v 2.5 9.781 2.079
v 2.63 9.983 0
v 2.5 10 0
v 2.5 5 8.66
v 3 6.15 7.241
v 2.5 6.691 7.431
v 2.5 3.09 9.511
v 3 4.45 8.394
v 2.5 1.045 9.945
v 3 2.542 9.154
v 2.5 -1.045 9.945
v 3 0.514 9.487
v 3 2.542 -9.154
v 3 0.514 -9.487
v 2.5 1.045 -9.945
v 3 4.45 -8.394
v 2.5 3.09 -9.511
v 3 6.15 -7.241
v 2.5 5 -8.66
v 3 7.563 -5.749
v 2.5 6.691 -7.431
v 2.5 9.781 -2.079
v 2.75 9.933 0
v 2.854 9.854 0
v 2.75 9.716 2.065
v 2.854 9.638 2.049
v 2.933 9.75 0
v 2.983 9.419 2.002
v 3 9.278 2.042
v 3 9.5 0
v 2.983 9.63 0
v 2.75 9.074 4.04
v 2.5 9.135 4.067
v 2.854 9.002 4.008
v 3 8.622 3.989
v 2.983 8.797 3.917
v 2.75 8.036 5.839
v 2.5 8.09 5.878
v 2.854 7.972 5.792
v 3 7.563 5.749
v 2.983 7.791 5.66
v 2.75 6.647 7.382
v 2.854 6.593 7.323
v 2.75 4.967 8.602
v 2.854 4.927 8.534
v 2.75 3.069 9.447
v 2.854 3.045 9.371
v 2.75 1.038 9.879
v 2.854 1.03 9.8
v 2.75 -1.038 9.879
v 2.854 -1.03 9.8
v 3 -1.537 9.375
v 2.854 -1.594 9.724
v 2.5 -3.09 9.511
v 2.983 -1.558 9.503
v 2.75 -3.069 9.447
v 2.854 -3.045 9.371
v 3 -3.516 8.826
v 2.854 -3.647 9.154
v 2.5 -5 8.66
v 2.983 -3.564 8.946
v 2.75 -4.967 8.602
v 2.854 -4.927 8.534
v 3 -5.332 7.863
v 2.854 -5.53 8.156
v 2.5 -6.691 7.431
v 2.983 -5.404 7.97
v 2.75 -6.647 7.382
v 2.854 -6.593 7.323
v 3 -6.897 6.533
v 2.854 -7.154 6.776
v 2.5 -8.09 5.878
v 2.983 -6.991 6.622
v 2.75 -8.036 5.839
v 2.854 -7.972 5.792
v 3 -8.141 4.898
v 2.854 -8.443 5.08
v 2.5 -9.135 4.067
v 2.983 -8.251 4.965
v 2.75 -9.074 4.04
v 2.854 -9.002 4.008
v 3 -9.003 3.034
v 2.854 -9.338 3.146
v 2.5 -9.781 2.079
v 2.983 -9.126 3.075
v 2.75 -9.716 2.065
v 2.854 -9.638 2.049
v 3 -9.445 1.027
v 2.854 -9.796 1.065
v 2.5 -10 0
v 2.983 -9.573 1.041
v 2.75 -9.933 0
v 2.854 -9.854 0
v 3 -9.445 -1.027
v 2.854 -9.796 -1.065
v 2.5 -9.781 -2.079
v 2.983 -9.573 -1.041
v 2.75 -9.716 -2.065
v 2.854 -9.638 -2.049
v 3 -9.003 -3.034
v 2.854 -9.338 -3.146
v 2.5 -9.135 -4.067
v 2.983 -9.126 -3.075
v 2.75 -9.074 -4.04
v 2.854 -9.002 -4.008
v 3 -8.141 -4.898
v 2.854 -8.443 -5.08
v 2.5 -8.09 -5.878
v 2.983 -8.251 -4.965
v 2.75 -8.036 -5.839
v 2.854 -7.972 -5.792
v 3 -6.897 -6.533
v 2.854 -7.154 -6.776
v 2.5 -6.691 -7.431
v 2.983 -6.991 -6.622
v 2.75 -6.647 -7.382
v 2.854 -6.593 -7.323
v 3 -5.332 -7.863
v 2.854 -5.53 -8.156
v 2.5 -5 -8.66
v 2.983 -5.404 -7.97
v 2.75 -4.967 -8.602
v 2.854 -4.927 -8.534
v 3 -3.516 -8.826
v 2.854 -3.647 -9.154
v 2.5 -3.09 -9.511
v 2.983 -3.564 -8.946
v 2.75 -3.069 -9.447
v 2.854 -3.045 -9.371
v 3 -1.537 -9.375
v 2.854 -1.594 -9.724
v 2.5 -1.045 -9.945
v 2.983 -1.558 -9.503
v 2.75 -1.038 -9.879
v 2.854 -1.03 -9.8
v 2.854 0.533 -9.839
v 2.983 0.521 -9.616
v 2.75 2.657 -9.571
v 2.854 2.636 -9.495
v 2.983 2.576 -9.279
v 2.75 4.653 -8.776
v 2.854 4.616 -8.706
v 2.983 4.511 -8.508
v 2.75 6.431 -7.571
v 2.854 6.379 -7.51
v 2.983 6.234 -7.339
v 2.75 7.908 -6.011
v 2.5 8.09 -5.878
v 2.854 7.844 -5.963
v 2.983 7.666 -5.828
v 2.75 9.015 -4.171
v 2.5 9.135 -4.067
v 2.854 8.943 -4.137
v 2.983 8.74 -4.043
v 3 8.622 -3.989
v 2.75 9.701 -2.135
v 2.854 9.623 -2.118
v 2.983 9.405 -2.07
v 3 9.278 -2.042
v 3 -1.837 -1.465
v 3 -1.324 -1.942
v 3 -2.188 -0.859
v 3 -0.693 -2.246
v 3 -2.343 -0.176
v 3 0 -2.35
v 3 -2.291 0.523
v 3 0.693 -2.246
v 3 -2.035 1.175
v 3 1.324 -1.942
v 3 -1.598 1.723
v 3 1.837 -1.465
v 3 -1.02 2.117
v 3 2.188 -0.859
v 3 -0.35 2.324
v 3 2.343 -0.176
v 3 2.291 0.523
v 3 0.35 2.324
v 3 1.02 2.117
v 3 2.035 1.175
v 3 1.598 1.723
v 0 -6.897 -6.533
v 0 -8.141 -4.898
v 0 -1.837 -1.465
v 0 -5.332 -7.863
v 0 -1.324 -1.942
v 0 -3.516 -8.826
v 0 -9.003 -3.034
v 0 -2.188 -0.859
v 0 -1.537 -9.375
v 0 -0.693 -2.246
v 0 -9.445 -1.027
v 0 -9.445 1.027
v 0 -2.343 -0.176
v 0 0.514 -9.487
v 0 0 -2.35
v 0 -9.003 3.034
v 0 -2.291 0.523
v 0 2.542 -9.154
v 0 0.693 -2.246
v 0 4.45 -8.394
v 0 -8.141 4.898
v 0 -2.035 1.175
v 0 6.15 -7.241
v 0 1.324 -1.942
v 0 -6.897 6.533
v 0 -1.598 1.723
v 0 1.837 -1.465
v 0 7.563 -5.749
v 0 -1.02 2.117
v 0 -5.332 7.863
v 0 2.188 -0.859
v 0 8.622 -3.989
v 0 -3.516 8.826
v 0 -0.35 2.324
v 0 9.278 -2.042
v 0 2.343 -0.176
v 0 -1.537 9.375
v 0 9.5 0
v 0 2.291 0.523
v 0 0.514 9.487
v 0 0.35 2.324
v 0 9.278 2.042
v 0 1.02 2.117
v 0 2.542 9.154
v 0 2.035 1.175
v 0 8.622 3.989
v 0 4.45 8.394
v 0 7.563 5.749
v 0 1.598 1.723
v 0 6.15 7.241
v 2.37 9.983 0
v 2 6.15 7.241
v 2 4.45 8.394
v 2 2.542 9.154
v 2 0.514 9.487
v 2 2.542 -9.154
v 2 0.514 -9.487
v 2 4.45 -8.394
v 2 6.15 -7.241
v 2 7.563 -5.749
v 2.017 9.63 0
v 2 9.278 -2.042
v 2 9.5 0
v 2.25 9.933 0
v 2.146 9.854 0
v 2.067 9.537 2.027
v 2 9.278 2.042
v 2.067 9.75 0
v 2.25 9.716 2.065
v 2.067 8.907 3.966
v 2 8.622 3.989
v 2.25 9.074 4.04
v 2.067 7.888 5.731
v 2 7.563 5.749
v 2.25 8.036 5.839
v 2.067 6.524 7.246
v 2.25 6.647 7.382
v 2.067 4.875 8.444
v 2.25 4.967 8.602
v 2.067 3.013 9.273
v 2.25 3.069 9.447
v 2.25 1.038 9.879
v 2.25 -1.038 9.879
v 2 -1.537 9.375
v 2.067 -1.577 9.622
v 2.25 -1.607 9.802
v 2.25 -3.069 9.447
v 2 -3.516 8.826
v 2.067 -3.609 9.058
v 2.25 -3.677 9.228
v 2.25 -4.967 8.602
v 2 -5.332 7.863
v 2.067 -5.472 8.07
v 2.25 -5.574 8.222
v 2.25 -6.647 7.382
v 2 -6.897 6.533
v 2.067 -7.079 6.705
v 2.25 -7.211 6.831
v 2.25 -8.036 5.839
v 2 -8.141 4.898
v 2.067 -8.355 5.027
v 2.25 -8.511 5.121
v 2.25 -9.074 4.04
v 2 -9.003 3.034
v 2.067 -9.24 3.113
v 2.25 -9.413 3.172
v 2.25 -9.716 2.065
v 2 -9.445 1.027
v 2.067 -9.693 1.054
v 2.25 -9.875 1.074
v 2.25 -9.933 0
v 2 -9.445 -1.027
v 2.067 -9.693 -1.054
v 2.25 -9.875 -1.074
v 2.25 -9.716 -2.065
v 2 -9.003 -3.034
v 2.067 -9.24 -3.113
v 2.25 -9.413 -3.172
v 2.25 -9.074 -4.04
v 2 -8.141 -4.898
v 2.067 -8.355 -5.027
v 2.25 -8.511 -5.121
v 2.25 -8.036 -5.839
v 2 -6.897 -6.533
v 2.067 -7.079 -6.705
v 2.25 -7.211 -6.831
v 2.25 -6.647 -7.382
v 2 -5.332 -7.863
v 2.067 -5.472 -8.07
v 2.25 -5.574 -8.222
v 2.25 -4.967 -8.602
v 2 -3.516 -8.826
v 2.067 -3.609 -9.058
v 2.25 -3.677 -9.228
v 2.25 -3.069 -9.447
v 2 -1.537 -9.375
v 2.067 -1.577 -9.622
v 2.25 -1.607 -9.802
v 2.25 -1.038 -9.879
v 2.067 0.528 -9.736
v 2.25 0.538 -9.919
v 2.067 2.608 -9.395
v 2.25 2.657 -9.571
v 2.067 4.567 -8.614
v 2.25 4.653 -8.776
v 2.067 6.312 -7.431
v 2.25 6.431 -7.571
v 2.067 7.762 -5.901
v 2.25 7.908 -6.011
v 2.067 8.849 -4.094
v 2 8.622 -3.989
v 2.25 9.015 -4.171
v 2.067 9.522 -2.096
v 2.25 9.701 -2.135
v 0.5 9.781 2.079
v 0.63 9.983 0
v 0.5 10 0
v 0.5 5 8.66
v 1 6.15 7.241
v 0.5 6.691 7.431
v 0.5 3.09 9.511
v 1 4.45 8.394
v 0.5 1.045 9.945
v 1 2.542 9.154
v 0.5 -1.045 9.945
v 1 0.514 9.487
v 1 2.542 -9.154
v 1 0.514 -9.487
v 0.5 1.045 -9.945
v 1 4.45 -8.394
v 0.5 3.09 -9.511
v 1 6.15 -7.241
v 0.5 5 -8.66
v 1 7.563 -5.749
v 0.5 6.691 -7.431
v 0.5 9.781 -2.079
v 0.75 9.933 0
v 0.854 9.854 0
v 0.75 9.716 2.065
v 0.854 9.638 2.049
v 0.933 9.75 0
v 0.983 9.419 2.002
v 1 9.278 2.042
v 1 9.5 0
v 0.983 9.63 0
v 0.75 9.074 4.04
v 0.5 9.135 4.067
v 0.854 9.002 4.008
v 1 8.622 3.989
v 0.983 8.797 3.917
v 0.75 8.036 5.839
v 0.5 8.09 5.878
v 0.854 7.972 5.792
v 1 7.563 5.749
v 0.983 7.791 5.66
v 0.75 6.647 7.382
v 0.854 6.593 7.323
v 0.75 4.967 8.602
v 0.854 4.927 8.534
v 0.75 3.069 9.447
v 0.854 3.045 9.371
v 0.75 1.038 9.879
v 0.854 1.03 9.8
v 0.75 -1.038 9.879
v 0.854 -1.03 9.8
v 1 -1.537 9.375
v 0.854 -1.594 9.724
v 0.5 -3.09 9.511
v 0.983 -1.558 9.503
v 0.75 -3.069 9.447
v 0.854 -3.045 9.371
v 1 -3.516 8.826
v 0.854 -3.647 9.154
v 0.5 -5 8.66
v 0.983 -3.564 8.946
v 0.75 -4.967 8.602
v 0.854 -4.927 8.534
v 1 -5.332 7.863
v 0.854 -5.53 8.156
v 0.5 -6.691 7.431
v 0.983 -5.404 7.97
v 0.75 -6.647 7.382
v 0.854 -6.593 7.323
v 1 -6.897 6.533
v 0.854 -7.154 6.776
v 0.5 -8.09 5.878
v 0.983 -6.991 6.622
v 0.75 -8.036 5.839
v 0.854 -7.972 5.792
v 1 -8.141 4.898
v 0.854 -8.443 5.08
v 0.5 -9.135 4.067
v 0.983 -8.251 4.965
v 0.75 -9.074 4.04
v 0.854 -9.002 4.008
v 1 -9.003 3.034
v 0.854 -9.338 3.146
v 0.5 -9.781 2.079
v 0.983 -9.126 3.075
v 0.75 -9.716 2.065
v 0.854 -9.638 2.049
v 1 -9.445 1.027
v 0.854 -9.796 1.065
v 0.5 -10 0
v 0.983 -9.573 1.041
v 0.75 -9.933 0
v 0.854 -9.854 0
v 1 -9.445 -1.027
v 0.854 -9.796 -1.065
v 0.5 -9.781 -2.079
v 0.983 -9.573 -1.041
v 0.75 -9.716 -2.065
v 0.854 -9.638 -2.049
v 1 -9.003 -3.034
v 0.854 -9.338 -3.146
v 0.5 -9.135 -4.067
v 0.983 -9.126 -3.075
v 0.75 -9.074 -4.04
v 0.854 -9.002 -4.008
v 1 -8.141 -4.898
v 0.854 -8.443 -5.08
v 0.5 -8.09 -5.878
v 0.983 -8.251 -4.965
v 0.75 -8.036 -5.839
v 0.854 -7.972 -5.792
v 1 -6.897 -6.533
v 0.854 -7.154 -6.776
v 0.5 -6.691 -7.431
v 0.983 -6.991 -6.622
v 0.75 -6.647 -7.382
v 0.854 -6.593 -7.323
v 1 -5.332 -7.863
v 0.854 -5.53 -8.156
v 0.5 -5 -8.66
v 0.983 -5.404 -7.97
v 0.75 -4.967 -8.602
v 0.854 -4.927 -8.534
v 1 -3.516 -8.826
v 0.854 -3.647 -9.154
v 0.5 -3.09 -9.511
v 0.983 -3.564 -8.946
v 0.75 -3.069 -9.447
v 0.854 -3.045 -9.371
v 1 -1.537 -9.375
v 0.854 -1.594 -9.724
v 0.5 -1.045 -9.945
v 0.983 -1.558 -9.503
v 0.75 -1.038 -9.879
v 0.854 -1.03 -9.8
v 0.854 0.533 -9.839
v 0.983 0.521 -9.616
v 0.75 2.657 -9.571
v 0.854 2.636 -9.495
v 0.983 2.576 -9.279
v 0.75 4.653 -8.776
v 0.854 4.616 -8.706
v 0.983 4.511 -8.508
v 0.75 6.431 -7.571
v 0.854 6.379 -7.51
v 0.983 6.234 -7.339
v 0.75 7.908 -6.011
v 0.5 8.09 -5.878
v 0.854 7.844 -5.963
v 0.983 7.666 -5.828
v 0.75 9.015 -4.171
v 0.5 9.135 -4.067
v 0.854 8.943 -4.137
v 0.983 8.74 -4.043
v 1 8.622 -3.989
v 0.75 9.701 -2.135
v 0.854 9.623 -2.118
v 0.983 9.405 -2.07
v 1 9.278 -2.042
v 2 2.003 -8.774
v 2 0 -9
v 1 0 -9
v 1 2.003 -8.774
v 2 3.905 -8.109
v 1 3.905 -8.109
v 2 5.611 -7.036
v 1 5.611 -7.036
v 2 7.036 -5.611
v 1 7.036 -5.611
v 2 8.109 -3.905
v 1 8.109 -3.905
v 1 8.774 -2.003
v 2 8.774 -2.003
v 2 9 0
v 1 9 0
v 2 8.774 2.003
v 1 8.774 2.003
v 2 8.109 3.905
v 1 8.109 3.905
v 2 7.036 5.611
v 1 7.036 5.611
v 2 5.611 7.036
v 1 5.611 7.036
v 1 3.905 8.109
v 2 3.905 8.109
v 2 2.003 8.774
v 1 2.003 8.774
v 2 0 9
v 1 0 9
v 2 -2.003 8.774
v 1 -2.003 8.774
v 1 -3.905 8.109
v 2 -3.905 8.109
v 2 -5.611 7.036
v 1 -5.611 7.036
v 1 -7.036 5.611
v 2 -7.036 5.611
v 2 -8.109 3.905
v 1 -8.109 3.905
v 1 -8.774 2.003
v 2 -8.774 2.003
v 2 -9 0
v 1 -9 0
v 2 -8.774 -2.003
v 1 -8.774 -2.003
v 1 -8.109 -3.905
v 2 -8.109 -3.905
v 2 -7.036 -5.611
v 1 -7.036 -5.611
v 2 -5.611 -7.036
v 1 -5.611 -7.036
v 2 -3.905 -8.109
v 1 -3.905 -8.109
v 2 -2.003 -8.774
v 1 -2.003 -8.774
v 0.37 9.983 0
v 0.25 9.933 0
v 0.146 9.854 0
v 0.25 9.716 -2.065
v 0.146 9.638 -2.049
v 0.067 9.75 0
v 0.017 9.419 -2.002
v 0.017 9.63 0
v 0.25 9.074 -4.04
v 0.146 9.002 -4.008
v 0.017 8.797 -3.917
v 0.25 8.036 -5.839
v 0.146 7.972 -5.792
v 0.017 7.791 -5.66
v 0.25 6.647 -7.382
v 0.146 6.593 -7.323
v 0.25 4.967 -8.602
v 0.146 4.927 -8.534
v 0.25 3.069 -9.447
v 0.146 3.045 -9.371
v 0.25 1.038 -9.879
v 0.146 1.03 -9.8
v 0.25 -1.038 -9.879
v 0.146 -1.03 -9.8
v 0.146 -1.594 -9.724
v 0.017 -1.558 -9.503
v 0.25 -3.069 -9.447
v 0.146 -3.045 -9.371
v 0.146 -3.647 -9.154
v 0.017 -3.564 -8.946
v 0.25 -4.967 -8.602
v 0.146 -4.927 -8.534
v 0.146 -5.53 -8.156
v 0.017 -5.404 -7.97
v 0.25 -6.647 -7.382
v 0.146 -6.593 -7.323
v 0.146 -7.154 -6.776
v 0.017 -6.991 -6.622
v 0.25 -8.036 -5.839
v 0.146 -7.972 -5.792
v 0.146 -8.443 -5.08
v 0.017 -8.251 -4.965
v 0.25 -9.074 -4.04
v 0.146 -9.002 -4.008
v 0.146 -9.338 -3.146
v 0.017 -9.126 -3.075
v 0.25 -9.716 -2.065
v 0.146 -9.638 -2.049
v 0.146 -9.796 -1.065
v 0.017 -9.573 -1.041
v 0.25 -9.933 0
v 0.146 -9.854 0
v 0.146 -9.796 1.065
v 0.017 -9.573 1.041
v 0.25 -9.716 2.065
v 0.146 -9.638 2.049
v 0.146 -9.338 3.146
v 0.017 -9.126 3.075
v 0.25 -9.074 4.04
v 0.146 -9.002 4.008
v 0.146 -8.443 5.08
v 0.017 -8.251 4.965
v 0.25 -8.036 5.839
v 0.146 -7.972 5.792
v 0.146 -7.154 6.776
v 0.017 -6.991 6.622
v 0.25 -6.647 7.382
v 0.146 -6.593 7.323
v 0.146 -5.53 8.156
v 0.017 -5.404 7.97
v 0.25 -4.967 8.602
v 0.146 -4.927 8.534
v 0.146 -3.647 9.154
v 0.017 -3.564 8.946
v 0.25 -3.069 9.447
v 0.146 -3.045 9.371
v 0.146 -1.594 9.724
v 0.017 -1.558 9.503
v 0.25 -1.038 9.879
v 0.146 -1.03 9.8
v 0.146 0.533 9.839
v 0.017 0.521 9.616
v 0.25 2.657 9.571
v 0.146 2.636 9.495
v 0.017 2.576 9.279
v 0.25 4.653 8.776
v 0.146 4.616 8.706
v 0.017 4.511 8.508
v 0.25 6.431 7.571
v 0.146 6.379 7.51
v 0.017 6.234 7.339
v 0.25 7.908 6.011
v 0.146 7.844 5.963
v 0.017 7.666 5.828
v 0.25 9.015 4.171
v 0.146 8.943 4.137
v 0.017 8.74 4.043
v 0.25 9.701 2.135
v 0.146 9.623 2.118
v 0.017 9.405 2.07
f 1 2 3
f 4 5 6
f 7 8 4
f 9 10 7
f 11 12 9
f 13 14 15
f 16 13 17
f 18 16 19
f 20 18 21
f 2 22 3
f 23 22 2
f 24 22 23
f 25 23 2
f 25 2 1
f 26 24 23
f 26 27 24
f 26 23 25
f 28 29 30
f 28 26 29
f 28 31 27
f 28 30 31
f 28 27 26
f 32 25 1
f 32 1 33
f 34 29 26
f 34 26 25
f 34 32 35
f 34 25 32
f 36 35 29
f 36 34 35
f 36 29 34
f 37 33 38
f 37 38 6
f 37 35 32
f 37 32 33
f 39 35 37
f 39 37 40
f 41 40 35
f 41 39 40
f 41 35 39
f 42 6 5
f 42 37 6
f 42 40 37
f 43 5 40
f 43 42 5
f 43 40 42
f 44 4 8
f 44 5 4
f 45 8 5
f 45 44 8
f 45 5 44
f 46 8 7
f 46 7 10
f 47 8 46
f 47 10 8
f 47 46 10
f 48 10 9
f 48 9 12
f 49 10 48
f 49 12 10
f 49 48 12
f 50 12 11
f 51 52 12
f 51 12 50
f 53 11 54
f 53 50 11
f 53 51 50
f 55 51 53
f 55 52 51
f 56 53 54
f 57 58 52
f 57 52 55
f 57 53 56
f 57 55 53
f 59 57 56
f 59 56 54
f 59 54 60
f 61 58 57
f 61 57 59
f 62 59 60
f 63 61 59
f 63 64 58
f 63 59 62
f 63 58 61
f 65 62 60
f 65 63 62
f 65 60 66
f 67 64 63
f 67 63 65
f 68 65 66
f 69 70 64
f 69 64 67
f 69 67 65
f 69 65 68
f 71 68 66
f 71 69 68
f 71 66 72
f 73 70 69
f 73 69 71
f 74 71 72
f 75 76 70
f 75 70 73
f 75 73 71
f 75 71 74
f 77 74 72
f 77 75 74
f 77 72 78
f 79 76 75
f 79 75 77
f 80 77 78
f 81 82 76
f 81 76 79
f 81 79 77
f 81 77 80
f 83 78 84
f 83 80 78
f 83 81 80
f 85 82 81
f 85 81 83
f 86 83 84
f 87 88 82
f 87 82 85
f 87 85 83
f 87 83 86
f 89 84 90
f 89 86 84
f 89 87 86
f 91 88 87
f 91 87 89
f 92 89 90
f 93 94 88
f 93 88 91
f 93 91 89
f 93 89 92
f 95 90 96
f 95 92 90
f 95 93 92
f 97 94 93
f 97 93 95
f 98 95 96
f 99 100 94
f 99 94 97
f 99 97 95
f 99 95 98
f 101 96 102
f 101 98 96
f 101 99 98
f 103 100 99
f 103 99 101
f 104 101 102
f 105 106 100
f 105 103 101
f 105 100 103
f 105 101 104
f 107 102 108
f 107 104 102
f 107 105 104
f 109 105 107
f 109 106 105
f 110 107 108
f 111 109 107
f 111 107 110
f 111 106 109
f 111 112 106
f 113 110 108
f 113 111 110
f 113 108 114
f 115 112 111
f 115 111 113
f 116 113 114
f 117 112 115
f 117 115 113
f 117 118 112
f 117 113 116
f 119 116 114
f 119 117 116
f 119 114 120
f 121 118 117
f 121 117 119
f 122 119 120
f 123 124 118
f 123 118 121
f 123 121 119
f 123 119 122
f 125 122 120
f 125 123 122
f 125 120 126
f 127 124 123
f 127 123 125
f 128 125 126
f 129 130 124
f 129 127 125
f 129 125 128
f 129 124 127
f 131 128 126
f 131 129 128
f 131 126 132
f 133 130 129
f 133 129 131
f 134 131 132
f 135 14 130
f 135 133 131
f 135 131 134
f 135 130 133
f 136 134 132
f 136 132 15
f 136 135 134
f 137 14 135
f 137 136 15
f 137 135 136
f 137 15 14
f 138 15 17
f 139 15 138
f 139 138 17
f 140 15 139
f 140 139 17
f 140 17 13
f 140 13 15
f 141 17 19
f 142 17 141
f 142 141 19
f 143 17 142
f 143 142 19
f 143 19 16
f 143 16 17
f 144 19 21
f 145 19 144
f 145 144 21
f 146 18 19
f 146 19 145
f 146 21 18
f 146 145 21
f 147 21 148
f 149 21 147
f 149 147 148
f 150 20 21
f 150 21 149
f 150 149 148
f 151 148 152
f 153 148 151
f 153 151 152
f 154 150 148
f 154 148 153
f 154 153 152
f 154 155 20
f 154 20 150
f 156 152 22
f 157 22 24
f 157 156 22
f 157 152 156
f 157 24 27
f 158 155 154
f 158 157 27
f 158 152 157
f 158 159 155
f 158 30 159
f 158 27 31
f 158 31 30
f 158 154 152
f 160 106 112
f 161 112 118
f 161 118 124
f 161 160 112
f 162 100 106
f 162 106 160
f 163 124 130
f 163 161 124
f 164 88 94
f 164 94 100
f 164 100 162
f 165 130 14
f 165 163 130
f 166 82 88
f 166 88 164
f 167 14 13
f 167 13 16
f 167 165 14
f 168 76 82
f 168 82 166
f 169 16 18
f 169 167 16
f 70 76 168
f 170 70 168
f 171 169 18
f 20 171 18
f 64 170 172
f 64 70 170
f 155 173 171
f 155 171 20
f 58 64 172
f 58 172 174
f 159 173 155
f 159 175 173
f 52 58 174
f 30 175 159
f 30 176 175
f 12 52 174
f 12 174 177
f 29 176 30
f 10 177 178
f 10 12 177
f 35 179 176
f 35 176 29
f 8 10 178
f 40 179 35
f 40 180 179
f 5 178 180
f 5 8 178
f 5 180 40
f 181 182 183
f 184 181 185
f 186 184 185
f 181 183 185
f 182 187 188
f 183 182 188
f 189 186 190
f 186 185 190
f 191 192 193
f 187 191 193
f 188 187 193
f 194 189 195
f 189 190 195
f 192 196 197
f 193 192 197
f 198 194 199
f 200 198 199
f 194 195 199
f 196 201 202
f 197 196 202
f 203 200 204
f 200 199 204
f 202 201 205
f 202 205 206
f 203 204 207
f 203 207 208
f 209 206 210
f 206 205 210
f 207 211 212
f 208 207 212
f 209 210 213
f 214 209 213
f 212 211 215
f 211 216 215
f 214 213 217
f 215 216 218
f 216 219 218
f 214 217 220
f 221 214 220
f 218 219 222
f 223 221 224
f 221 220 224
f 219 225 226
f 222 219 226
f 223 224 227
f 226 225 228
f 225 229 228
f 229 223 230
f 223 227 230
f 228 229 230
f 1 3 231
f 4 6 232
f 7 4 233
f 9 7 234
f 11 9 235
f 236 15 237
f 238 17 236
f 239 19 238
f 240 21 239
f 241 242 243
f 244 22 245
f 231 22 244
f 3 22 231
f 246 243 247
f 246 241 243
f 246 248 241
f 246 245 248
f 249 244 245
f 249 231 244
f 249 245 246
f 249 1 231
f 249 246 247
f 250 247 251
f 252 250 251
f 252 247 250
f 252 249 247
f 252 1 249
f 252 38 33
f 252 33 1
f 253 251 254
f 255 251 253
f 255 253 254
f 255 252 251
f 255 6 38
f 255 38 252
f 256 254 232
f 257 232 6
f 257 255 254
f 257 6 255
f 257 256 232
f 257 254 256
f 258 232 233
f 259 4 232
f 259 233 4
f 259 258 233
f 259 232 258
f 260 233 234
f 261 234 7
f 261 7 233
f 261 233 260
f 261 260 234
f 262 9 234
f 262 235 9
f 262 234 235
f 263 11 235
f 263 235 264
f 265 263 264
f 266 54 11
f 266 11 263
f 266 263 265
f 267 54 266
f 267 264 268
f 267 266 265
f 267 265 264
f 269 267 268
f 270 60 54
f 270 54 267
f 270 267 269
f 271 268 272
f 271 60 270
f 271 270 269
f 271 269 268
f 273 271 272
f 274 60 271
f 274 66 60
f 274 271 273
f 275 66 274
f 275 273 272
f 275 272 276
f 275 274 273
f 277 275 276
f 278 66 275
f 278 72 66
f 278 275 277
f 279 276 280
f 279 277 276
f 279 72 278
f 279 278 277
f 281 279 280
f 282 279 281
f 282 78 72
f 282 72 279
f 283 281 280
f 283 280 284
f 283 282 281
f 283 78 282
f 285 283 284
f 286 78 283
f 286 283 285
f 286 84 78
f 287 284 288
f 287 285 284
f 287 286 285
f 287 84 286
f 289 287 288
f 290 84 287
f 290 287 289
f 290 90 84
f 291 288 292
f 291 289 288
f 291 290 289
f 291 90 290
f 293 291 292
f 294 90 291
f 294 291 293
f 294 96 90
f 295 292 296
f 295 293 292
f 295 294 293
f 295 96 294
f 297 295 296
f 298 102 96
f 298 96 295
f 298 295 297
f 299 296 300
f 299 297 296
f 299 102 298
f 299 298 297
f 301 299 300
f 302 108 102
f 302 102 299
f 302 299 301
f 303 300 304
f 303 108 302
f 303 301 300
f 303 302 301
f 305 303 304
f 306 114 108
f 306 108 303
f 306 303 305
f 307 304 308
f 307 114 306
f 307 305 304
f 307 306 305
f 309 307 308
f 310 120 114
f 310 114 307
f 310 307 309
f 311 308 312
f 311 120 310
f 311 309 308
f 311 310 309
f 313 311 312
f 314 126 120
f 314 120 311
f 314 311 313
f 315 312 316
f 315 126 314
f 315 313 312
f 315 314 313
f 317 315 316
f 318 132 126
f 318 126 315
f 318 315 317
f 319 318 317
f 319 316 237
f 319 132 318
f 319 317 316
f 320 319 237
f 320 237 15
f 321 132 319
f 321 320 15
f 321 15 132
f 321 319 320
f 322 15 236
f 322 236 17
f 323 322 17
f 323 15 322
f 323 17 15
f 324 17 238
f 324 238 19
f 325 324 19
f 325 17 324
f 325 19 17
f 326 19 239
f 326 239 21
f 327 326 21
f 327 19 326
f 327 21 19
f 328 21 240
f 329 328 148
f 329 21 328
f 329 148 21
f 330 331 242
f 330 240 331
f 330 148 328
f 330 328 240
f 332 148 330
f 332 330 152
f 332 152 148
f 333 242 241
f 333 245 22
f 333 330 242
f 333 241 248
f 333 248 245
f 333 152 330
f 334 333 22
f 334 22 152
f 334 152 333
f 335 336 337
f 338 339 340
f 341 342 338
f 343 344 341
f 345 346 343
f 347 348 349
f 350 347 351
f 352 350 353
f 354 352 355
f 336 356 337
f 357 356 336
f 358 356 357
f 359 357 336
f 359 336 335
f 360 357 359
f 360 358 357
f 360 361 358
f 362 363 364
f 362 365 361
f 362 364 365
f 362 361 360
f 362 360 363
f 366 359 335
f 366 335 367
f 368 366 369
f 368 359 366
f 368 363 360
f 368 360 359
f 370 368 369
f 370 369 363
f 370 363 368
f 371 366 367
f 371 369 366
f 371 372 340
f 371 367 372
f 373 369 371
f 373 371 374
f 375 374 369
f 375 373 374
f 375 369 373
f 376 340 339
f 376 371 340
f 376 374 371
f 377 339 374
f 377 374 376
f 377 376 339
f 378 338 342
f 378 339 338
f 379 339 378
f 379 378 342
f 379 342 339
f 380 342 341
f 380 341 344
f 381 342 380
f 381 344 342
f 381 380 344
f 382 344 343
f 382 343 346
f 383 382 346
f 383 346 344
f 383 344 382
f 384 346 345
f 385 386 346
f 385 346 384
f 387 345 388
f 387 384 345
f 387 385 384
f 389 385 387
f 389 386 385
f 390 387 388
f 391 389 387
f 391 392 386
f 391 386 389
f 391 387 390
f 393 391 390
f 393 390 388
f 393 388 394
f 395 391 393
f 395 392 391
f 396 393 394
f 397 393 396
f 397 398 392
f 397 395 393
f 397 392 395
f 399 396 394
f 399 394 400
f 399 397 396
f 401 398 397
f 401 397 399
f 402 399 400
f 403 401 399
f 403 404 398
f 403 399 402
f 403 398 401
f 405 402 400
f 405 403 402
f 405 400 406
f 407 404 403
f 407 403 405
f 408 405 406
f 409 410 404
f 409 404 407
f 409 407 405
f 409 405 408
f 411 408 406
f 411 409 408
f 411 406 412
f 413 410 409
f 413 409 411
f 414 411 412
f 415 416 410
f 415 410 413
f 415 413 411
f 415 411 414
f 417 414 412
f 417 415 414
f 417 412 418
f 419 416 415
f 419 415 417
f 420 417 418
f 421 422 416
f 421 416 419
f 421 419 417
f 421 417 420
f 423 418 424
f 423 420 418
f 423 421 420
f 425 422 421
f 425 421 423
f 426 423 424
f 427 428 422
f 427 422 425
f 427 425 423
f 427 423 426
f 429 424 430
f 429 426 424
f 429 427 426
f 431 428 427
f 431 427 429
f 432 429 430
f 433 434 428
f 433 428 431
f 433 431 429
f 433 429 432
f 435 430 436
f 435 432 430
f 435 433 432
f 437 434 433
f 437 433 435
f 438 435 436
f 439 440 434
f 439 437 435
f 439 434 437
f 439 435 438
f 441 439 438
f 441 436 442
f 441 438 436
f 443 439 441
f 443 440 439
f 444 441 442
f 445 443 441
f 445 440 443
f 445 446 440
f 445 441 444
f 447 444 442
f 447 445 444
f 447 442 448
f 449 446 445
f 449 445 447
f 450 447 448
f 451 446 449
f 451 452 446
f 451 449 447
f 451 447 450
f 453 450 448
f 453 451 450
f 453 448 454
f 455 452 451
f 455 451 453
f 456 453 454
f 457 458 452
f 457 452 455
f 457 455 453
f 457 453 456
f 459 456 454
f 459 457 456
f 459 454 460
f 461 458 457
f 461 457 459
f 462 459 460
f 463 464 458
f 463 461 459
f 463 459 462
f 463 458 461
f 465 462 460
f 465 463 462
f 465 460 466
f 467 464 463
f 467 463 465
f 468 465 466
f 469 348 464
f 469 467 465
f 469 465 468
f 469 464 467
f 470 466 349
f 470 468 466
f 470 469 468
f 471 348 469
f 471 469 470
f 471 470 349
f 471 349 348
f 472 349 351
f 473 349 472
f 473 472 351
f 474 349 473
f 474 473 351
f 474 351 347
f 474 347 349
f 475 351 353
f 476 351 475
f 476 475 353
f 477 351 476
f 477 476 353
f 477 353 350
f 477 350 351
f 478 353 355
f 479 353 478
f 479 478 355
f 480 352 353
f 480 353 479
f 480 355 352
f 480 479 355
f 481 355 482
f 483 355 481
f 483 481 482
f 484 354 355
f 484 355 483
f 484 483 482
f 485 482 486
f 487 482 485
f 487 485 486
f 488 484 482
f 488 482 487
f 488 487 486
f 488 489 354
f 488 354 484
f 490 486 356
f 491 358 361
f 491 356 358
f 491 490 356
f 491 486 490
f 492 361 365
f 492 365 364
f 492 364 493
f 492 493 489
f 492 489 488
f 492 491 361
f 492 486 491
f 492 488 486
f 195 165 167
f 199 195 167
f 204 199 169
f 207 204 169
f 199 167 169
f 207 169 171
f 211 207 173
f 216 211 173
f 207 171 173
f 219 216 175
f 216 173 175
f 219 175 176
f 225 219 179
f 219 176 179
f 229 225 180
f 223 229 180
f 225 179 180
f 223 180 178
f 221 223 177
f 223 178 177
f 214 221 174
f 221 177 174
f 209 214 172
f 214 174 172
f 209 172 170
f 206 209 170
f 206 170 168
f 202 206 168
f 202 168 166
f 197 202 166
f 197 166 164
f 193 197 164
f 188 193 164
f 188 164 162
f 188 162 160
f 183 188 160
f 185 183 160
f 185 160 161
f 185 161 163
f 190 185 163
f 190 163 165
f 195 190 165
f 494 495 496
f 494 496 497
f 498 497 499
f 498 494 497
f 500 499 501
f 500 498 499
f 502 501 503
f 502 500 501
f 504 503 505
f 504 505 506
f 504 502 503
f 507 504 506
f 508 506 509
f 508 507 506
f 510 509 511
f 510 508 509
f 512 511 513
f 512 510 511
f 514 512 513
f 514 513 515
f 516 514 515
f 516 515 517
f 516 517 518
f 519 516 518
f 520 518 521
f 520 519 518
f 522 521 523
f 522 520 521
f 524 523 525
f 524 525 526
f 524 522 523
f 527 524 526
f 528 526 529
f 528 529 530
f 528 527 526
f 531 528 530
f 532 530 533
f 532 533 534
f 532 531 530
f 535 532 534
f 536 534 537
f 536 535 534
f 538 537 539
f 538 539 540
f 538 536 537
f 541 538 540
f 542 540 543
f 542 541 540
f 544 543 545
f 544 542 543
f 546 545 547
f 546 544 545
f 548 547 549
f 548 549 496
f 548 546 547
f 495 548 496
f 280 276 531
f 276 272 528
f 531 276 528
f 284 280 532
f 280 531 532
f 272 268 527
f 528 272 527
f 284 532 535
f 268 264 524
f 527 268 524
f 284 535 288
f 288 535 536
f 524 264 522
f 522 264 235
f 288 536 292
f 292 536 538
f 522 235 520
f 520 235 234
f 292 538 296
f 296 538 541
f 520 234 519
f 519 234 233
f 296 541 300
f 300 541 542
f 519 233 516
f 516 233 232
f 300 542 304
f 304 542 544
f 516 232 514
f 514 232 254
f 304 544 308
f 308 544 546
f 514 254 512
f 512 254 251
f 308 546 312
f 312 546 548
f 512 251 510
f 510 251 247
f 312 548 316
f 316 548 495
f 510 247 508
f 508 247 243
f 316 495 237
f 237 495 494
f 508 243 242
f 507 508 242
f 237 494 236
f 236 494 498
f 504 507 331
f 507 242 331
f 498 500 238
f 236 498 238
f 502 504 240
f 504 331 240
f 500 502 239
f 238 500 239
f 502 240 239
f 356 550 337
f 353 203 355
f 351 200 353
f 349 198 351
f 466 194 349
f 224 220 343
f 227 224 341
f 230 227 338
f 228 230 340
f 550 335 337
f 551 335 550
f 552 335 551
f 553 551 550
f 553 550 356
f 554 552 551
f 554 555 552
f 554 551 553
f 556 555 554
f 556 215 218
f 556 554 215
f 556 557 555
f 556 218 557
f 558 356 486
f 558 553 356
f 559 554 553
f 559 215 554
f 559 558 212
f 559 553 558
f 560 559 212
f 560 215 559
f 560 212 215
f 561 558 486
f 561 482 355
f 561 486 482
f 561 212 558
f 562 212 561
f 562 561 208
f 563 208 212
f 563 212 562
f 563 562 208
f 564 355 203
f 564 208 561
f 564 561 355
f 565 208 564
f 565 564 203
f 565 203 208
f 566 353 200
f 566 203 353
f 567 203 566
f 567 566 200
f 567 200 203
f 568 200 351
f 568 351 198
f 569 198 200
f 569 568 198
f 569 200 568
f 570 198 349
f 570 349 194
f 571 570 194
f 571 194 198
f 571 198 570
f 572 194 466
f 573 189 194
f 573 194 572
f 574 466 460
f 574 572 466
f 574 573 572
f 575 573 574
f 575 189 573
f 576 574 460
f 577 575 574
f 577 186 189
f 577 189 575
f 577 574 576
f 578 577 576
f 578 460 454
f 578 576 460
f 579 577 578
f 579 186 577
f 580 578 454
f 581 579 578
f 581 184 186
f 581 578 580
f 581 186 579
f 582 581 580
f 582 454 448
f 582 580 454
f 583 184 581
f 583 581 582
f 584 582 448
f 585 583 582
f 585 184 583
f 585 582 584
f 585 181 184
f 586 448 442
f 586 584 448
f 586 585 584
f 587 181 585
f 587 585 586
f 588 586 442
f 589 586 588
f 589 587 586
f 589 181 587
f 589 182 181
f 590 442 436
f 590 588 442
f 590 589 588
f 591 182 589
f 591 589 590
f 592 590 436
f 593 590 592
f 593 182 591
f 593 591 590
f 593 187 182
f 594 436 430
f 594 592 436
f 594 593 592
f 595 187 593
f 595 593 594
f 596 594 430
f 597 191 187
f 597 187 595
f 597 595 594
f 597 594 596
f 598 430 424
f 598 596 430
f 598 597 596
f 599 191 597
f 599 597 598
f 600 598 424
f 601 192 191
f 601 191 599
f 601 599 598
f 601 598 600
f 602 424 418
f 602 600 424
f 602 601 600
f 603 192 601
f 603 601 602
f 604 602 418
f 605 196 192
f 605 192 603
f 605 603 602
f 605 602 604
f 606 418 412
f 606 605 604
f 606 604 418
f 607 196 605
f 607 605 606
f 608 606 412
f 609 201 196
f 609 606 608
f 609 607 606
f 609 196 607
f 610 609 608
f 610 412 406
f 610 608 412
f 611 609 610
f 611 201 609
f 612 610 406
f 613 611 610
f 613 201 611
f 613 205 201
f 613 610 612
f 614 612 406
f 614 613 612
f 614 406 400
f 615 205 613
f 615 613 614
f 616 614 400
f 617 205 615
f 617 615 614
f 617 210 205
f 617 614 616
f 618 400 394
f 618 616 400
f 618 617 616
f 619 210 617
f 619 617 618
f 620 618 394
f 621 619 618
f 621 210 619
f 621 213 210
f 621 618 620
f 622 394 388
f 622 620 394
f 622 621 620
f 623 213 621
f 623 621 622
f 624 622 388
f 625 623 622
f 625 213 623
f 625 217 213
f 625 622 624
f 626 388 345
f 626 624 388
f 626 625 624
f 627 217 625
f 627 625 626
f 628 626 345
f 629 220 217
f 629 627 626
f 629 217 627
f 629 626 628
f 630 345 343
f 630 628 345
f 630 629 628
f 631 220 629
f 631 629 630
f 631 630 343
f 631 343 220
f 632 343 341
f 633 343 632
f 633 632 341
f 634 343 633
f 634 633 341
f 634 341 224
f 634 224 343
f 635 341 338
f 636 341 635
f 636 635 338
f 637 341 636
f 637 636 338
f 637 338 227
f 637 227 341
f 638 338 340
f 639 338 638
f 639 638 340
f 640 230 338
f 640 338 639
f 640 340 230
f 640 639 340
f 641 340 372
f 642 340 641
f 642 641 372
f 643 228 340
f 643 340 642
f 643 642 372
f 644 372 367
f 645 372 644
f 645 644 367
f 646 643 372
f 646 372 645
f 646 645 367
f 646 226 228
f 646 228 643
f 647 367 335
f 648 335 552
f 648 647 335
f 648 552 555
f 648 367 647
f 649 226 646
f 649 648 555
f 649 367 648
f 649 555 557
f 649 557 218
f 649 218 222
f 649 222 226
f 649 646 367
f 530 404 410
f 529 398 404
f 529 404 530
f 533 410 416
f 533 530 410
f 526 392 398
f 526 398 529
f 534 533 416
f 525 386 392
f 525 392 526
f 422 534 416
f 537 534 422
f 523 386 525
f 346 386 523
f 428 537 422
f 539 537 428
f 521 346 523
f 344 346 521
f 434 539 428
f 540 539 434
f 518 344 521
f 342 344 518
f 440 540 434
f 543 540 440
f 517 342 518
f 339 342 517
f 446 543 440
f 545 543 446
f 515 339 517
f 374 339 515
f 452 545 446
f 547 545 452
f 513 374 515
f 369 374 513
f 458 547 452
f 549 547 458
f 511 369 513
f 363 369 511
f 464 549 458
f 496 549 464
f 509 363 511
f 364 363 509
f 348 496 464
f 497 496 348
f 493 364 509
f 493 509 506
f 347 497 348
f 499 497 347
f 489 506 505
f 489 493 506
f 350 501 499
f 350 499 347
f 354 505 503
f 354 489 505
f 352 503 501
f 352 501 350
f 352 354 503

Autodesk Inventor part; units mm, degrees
ref_plane "YZ Plane" through (0, 0, 0) normal (1, 0, 0) x (0, 1, 0)
ref_plane "XZ Plane" through (0, 0, 0) normal (0, 1, 0) x (-1, 0, 0)
ref_plane "XY Plane" through (0, 0, 0) normal (0, 0, 1) x (1, 0, 0)
sketch "Boceto1" plane through (0, 0, 0) normal (1, 0, 0) x (0, 1, 0)
  circle A0 centre (0, 0) radius 10
  dimension "d2" = 20
extrude "Extrusión1" add sketch "Boceto1" along normal blind 3
ref_plane "Plano de trabajo1" through (1.5, 0, 0) normal (1, 0, 0) x (0, 0, -1)
sketch "Boceto2" plane through (1.5, 0, 0) normal (1, 0, 0) x (0, 0, -1)
  circle A0 centre (0, 0) radius 14.342
  circle A1 centre (0, 0) radius 9
  dimension "d3" = 18
extrude "Extrusión2" cut sketch "Boceto2" along normal blind 0.5 and the other way blind 0.5
fillet "Empalme1" radius 0.5 4 edges at (3, -10, 0) (2, -10, 0) (1, -10, 0) (0, -10, 0)
sketch "Boceto3" plane through (3, 0, 0) normal (1, 0, 0) x (0, 0, -1)
  circle A0 centre (0, 0) radius 2.35
  dimension "d9" = 4.7
extrude "Extrusión3" cut sketch "Boceto3" against normal blind 10
properties part number "rueda servo"
